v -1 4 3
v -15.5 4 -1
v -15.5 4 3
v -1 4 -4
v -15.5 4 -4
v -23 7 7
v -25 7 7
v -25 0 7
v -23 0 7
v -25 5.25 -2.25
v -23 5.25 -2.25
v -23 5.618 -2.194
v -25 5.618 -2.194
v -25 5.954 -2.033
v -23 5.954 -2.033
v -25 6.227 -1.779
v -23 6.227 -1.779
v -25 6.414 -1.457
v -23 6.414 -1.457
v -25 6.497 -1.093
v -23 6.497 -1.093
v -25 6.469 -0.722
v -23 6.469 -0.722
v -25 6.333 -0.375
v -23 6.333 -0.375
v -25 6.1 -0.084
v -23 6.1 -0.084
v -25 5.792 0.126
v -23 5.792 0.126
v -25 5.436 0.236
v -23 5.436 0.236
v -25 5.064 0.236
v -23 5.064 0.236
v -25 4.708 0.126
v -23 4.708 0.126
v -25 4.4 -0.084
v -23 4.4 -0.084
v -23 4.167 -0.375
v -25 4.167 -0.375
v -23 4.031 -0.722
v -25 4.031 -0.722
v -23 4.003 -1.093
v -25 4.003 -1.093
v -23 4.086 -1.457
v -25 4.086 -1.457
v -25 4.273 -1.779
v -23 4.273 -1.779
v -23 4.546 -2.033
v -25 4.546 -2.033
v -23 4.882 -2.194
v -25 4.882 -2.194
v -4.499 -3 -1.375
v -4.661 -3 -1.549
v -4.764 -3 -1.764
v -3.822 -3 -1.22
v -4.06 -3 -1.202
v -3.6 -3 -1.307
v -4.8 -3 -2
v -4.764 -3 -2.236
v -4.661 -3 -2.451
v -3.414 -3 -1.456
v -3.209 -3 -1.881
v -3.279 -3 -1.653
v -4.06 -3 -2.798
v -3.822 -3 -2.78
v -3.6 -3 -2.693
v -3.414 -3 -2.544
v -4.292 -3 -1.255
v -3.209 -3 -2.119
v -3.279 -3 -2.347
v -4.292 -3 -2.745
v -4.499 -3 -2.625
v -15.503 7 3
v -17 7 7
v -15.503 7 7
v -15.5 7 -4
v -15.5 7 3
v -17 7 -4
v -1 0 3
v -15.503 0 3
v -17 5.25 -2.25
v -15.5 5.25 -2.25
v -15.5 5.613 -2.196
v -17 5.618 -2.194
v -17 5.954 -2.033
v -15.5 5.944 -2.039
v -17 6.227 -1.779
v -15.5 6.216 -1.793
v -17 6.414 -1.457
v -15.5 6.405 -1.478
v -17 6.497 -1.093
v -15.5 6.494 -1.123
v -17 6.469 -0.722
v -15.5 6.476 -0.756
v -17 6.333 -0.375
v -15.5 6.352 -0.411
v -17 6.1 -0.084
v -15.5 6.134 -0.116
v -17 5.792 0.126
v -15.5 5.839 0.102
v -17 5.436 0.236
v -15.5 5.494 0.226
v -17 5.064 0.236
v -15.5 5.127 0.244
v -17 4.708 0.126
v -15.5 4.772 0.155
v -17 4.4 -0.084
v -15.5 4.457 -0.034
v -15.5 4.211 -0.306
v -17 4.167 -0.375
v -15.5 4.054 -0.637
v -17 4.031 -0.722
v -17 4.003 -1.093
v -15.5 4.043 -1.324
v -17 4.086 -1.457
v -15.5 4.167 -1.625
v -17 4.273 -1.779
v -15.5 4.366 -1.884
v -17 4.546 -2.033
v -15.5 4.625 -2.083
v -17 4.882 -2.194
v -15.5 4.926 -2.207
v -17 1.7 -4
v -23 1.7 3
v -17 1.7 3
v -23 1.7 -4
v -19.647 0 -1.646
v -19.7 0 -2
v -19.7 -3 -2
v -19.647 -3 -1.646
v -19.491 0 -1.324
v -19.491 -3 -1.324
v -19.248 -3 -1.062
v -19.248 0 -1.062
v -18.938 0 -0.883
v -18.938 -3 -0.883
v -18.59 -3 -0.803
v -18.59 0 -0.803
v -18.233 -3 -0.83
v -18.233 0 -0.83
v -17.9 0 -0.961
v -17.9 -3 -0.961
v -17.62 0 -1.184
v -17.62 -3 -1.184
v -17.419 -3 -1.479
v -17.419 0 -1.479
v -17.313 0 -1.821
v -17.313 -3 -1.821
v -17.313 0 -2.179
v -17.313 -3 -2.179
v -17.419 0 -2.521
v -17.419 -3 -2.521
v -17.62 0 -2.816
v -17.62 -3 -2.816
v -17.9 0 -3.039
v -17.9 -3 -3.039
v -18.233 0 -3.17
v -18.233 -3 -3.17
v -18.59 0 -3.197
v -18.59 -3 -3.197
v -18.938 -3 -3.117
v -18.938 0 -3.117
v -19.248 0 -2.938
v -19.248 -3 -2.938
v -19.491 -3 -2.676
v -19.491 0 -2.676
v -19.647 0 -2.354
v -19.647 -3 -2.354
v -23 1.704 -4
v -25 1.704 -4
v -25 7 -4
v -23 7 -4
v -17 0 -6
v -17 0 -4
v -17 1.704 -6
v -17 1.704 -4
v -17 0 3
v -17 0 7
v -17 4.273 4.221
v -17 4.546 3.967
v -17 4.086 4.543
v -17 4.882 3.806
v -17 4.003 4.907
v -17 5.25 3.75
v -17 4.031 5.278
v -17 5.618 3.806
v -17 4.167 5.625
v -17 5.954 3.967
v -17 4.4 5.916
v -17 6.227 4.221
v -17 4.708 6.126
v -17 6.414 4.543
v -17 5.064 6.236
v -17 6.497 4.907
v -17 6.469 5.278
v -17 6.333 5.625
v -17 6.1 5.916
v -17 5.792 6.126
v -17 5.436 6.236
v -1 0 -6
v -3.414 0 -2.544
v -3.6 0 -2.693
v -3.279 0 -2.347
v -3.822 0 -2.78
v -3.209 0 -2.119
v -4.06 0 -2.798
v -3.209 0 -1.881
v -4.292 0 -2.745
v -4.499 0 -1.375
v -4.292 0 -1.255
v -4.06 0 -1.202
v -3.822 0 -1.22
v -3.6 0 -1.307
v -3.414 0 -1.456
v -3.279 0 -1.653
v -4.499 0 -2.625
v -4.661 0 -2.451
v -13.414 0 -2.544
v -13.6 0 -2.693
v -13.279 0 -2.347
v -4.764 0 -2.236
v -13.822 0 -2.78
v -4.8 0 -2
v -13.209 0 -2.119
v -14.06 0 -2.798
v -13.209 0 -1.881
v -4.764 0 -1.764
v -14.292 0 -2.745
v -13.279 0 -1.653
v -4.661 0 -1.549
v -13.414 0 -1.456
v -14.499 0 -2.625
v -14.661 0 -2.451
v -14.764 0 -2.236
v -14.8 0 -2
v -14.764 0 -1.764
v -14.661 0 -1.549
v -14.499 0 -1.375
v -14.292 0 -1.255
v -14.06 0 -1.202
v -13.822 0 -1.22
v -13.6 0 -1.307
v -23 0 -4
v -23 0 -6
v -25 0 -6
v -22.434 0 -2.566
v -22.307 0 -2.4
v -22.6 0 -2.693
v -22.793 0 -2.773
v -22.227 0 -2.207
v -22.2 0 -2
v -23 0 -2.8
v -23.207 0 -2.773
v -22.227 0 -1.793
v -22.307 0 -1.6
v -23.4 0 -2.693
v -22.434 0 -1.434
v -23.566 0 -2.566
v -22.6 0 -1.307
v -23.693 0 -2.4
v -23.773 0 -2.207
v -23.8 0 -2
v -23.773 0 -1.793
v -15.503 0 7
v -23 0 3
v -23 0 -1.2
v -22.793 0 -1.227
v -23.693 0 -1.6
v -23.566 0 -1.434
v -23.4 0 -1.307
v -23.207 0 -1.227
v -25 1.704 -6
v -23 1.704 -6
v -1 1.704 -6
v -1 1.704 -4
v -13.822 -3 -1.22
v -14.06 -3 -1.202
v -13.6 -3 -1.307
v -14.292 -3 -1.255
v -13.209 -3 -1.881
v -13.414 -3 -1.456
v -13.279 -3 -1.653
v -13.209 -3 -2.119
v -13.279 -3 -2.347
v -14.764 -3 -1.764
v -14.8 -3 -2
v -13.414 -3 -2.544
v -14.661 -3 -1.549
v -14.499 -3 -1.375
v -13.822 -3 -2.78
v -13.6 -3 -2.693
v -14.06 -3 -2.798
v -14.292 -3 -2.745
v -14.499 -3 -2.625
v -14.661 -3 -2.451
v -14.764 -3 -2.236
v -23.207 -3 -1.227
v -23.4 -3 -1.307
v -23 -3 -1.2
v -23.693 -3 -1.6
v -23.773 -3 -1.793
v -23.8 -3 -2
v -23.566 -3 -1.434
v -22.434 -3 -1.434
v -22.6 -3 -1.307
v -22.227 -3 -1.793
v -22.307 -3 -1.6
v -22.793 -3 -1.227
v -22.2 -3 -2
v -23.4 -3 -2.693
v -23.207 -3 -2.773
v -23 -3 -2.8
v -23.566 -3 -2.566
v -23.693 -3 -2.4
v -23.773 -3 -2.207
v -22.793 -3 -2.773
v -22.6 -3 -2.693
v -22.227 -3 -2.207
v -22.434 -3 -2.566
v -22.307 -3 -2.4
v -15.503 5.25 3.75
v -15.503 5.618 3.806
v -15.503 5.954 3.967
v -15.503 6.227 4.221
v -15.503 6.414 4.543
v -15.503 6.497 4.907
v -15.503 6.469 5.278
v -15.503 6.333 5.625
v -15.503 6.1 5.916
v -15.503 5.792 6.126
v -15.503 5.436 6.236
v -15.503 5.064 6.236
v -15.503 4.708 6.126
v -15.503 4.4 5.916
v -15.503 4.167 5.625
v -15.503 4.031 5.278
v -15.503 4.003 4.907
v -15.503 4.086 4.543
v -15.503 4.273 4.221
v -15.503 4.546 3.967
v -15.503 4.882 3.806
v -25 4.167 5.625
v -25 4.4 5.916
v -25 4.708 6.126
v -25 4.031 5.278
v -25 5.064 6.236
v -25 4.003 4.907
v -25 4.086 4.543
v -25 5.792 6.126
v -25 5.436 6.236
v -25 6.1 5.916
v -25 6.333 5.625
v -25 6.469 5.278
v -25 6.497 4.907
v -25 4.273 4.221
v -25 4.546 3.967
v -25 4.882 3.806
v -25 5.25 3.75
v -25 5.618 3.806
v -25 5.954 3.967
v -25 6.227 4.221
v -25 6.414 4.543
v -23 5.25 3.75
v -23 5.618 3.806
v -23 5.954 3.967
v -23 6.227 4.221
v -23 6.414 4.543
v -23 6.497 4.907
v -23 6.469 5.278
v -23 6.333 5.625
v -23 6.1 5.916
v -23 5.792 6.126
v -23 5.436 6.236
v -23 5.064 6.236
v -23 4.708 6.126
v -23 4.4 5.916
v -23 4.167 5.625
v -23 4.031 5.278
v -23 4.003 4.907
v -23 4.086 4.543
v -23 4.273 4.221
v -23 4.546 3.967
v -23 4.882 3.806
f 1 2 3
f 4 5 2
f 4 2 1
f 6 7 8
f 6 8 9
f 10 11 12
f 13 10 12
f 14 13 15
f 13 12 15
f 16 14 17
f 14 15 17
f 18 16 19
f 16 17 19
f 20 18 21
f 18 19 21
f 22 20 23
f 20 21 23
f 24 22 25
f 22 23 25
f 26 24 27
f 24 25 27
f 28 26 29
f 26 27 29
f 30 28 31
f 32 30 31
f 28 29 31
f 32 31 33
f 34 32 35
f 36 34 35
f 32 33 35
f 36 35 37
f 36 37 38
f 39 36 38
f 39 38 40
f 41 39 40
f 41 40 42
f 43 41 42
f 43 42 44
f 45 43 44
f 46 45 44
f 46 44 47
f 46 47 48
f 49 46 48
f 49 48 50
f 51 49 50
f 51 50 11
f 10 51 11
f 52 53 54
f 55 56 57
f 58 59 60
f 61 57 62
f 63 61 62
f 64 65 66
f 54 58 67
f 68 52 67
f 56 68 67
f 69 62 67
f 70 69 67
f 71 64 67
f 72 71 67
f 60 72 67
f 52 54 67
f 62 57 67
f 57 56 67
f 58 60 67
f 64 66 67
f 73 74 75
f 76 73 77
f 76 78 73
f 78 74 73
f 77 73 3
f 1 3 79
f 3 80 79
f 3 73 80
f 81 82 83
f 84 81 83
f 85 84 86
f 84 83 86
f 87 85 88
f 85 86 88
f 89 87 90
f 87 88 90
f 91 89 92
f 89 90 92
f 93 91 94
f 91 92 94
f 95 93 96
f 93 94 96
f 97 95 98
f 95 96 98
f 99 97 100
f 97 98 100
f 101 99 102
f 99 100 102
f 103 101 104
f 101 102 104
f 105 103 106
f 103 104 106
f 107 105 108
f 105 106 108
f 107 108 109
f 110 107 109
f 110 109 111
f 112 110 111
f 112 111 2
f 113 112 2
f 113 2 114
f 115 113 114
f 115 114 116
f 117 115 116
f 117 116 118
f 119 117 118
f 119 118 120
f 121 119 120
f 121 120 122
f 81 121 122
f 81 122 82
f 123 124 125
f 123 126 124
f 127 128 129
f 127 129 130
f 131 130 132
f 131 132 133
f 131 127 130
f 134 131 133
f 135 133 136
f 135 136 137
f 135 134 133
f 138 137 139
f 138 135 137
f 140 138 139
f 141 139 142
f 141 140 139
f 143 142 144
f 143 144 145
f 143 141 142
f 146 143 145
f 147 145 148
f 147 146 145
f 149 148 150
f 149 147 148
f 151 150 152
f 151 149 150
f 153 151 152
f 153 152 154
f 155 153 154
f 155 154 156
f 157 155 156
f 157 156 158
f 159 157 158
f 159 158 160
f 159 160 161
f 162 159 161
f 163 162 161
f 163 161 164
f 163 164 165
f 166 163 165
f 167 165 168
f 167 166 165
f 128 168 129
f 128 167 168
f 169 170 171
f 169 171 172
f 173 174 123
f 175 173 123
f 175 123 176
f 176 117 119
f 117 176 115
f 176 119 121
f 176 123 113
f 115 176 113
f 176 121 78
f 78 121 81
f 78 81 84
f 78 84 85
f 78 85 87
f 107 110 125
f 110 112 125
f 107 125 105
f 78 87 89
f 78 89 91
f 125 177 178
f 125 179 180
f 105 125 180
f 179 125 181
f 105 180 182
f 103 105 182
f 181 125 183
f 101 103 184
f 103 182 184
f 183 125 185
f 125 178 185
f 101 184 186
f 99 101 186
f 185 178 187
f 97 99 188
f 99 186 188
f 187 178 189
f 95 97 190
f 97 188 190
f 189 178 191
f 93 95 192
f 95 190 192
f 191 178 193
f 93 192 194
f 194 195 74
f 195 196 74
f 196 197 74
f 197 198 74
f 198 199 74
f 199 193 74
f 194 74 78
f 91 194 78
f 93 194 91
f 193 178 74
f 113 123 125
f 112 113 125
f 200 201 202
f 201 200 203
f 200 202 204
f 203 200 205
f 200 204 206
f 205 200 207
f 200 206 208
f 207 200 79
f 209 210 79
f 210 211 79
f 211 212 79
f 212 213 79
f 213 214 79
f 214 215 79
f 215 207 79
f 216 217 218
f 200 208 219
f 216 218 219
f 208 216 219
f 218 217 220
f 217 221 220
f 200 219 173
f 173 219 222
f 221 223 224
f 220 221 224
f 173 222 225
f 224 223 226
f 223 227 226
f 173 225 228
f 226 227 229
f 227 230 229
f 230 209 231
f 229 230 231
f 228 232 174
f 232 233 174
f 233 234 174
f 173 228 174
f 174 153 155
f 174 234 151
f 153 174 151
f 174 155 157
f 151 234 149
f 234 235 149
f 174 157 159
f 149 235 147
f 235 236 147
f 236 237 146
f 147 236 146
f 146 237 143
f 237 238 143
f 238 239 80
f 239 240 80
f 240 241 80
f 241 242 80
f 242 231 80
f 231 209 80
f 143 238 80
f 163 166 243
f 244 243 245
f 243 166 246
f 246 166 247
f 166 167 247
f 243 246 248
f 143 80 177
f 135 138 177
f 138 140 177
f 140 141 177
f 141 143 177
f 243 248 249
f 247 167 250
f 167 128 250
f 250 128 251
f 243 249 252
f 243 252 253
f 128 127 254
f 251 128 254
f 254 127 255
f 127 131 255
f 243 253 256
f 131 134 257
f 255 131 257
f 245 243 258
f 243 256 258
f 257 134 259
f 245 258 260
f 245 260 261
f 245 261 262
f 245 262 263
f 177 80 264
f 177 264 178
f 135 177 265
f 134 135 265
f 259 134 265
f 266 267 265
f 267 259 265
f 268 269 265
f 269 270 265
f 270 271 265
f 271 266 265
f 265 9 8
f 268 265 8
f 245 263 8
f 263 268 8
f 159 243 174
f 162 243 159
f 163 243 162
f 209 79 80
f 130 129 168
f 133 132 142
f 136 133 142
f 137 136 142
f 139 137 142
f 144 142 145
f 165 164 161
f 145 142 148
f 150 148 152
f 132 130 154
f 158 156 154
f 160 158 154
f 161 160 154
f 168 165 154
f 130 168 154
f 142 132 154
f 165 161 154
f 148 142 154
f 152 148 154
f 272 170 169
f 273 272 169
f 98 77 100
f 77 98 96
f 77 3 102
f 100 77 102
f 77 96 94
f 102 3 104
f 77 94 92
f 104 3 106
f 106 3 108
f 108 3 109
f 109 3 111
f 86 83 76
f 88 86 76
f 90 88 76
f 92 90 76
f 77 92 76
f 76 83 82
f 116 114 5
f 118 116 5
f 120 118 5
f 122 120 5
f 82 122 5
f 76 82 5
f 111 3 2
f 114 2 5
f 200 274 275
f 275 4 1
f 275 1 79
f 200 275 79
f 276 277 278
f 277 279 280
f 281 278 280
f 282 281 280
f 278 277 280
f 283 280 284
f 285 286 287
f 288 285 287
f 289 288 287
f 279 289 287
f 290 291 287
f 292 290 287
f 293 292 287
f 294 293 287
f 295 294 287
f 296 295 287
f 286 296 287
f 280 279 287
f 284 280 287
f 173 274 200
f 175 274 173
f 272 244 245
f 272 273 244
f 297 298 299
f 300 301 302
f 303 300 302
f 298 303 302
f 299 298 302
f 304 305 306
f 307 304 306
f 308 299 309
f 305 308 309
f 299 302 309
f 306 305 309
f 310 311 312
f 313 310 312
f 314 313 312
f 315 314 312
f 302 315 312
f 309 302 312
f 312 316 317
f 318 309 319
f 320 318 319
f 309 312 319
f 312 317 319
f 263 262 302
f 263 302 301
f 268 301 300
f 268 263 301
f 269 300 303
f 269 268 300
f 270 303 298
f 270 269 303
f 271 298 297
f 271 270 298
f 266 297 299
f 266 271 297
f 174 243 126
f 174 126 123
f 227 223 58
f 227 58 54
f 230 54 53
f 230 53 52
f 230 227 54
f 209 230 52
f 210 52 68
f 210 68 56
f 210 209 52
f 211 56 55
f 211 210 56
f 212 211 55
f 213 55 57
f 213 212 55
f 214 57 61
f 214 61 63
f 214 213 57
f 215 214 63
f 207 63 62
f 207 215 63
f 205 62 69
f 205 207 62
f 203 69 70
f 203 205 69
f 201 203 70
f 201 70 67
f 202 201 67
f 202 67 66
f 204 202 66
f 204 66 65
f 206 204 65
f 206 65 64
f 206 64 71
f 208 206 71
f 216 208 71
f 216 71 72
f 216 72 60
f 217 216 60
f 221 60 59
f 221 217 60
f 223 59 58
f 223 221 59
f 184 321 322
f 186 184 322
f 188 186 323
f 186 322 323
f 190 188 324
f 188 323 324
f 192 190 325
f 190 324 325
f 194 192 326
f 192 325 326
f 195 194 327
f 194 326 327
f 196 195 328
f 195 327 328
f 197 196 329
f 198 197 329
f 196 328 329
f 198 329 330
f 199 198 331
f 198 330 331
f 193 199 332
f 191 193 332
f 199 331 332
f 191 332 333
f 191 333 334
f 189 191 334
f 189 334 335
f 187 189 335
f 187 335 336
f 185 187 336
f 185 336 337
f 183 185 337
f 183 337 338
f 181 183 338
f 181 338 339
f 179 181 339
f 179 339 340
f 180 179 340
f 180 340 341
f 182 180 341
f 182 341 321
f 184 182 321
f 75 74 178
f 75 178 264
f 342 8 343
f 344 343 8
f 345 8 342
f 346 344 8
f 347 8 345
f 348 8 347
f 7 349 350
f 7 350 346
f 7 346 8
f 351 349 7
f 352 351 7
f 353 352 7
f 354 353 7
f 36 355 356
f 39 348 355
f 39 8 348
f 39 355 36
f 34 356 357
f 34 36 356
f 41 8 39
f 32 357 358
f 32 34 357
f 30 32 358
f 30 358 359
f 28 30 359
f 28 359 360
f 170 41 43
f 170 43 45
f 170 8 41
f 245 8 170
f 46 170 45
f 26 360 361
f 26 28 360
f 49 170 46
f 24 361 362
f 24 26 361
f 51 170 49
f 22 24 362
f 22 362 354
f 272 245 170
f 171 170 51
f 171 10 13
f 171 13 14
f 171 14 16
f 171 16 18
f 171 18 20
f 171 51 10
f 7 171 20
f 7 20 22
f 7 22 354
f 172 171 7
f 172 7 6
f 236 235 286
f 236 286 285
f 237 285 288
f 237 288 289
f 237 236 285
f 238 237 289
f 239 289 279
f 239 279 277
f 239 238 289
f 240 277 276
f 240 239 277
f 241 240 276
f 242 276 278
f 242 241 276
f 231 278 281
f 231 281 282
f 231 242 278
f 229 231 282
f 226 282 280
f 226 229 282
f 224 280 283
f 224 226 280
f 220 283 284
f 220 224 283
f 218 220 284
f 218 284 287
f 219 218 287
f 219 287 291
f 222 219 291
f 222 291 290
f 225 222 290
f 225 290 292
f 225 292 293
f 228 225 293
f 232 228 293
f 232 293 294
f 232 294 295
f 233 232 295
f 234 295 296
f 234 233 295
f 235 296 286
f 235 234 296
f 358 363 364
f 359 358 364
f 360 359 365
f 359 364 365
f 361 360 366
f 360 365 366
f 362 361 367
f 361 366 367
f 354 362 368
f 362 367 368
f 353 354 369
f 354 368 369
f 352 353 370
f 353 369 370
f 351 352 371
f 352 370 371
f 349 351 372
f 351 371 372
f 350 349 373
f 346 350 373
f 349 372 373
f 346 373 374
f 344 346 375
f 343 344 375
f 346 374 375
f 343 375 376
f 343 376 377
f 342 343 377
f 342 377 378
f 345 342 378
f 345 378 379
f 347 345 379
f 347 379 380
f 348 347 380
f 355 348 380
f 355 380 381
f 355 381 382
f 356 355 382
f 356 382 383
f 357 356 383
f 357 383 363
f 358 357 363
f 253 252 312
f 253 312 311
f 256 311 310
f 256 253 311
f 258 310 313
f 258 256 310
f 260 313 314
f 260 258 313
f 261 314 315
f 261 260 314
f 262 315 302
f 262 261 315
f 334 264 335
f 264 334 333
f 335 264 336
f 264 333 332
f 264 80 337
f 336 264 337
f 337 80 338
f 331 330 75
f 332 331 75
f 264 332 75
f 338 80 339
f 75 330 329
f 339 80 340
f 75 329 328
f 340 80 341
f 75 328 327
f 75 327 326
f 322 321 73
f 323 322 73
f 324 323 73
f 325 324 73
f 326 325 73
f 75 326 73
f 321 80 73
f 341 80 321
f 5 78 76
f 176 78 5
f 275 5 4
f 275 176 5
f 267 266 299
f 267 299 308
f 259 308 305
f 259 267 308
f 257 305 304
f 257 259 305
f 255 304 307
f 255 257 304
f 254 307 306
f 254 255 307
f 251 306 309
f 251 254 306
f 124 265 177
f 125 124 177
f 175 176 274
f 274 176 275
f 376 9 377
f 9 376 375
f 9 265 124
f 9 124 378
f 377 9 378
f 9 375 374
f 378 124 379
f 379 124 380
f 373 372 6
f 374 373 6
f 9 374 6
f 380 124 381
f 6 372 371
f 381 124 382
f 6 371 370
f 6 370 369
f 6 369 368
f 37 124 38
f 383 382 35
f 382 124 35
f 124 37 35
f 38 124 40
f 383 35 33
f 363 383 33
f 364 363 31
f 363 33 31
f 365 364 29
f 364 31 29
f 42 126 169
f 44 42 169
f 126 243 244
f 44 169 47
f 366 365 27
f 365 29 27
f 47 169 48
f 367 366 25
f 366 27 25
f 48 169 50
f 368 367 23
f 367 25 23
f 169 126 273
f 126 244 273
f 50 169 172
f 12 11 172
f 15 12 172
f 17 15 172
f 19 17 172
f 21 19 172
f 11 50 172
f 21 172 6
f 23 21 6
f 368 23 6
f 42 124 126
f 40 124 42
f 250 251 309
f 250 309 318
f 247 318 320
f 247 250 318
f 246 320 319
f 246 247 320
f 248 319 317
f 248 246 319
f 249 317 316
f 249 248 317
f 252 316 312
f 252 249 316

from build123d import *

# Parameters (mm, degrees)
BOSS_EXTRUDE1_DEPTH = 3
SKETCH3_W           = 24
SKETCH3_H           = 4
BOSS_EXTRUDE2_DEPTH = 4
SKETCH6_W           = 24
SKETCH6_H           = 4
BOSS_EXTRUDE4_DEPTH = 3
CUT_EXTRUDE1_DEPTH  = 2.3
SKETCH9_W           = 2
SKETCH9_H           = 7
SKETCH9_W_2         = 1.5
BOSS_EXTRUDE5_DEPTH = 3
SKETCH11_W          = 2
SKETCH11_H          = 7
SKETCH11_W_2        = 1.497470588
BOSS_EXTRUDE6_DEPTH = 4
SKETCH10_R          = 1.25
CUT_EXTRUDE2_DEPTH  = 10.5
BOSS_EXTRUDE7_DEPTH = 2


with BuildPart() as part:
    # Sketch1 → Boss-Extrude1 (new body)
    with BuildSketch(Plane(origin=(0, 0, 0), x_dir=(1, 0, 0), z_dir=(0, 1, 0))):
        with BuildLine():
            ThreePointArc((-17.3, 2), (-18.5, 3.2), (-19.7, 2))
            Line((-19.7, 2), (-17.3, 2))
        make_face()
        with BuildLine():
            Line((-17.3, 2), (-19.7, 2))
            ThreePointArc((-19.7, 2), (-18.5, 0.8), (-17.3, 2))
        make_face()
        with BuildLine():
            Line((-23, 2.8), (-23, 2))
            Line((-23, 2), (-23, 1.2))
            ThreePointArc((-23, 1.2), (-22.434314575, 1.434314575), (-22.2, 2))
            ThreePointArc((-22.2, 2), (-22.434314575, 2.565685425), (-23, 2.8))
        make_face()
        with BuildLine():
            Line((-23, 1.2), (-23, 2))
            Line((-23, 2), (-23.8, 2))
            ThreePointArc((-23.8, 2), (-23.565685425, 1.434314575), (-23, 1.2))
        make_face()
        with BuildLine():
            Line((-23.8, 2), (-23, 2))
            Line((-23, 2), (-23, 2.8))
            ThreePointArc((-23, 2.8), (-23.565685425, 2.565685425), (-23.8, 2))
        make_face()
        with BuildLine():
            ThreePointArc((-13.2, 2), (-14, 2.8), (-14.8, 2))
            Line((-14.8, 2), (-13.2, 2))
        make_face()
        with BuildLine():
            Line((-13.2, 2), (-14.8, 2))
            ThreePointArc((-14.8, 2), (-14, 1.2), (-13.2, 2))
        make_face()
        with BuildLine():
            ThreePointArc((-3.2, 2), (-4, 2.8), (-4.8, 2))
            Line((-4.8, 2), (-3.2, 2))
        make_face()
        with BuildLine():
            Line((-3.2, 2), (-4.8, 2))
            ThreePointArc((-4.8, 2), (-4, 1.2), (-3.2, 2))
        make_face()
    extrude(amount=-BOSS_EXTRUDE1_DEPTH)

    # Sketch3 → Boss-Extrude2 (add)
    with BuildSketch(Plane(origin=(0, 0, 0), x_dir=(1, 0, 0), z_dir=(0, 1, 0))):
        with Locations((-13, 2)):
            Rectangle(SKETCH3_W, SKETCH3_H)
    extrude(amount=BOSS_EXTRUDE2_DEPTH)

    # Sketch6 → Boss-Extrude4 (add)
    with BuildSketch(Plane.XY):
        with Locations((-13, 2)):
            Rectangle(SKETCH6_W, SKETCH6_H)
    extrude(amount=BOSS_EXTRUDE4_DEPTH)

    # Sketch7 → Cut-Extrude1 (cut)
    with BuildSketch(Plane(origin=(0, 4, 0), x_dir=(1, 0, 0), z_dir=(0, 1, 0))):
        Polygon((-23, 0.5), (-23, -3), (-17, -3), (-17, 4), (-23, 4), align=None)
    extrude(amount=-CUT_EXTRUDE1_DEPTH, mode=Mode.SUBTRACT)

    # Sketch9 → Boss-Extrude5 (add)
    with BuildSketch(Plane(origin=(0, 4, 0), x_dir=(1, 0, 0), z_dir=(0, 1, 0))):
        with Locations((-24, 0.5)):
            Rectangle(SKETCH9_W, SKETCH9_H)
        with Locations((-16.25, 0.5)):
            Rectangle(SKETCH9_W_2, SKETCH9_H)
    extrude(amount=BOSS_EXTRUDE5_DEPTH)

    # Sketch11 → Boss-Extrude6 (add)
    with BuildSketch(Plane.XY.offset(3)):
        with Locations((-24, 3.5)):
            Rectangle(SKETCH11_W, SKETCH11_H)
        with Locations((-16.251264706, 3.5)):
            Rectangle(SKETCH11_W_2, SKETCH11_H)
    extrude(amount=BOSS_EXTRUDE6_DEPTH)

    # Sketch10 → Cut-Extrude2 (cut, through all)
    with BuildSketch(Plane(origin=(-15.5, 0, 0), x_dir=(0, 0, -1), z_dir=(1, 0, 0))):
        with Locations((1, 5.25)):
            Circle(SKETCH10_R)
        with Locations((-5, 5.25)):
            Circle(SKETCH10_R)
    extrude(amount=-CUT_EXTRUDE2_DEPTH, mode=Mode.SUBTRACT)

    # Sketch12 → Boss-Extrude7 (add)
    with BuildSketch(Plane(origin=(0, 0, -4), x_dir=(-1, 0, 0), z_dir=(0, 0, -1))):
        Polygon((1, 0), (17, 0), (17, 1.7), (17, 1.704314434), (1, 1.704314434), align=None)
        Polygon((23, 0), (25, 0), (25, 1.704314434), (23, 1.704314434), (23, 1.7), align=None)
    extrude(amount=BOSS_EXTRUDE7_DEPTH)


solid = part.part
